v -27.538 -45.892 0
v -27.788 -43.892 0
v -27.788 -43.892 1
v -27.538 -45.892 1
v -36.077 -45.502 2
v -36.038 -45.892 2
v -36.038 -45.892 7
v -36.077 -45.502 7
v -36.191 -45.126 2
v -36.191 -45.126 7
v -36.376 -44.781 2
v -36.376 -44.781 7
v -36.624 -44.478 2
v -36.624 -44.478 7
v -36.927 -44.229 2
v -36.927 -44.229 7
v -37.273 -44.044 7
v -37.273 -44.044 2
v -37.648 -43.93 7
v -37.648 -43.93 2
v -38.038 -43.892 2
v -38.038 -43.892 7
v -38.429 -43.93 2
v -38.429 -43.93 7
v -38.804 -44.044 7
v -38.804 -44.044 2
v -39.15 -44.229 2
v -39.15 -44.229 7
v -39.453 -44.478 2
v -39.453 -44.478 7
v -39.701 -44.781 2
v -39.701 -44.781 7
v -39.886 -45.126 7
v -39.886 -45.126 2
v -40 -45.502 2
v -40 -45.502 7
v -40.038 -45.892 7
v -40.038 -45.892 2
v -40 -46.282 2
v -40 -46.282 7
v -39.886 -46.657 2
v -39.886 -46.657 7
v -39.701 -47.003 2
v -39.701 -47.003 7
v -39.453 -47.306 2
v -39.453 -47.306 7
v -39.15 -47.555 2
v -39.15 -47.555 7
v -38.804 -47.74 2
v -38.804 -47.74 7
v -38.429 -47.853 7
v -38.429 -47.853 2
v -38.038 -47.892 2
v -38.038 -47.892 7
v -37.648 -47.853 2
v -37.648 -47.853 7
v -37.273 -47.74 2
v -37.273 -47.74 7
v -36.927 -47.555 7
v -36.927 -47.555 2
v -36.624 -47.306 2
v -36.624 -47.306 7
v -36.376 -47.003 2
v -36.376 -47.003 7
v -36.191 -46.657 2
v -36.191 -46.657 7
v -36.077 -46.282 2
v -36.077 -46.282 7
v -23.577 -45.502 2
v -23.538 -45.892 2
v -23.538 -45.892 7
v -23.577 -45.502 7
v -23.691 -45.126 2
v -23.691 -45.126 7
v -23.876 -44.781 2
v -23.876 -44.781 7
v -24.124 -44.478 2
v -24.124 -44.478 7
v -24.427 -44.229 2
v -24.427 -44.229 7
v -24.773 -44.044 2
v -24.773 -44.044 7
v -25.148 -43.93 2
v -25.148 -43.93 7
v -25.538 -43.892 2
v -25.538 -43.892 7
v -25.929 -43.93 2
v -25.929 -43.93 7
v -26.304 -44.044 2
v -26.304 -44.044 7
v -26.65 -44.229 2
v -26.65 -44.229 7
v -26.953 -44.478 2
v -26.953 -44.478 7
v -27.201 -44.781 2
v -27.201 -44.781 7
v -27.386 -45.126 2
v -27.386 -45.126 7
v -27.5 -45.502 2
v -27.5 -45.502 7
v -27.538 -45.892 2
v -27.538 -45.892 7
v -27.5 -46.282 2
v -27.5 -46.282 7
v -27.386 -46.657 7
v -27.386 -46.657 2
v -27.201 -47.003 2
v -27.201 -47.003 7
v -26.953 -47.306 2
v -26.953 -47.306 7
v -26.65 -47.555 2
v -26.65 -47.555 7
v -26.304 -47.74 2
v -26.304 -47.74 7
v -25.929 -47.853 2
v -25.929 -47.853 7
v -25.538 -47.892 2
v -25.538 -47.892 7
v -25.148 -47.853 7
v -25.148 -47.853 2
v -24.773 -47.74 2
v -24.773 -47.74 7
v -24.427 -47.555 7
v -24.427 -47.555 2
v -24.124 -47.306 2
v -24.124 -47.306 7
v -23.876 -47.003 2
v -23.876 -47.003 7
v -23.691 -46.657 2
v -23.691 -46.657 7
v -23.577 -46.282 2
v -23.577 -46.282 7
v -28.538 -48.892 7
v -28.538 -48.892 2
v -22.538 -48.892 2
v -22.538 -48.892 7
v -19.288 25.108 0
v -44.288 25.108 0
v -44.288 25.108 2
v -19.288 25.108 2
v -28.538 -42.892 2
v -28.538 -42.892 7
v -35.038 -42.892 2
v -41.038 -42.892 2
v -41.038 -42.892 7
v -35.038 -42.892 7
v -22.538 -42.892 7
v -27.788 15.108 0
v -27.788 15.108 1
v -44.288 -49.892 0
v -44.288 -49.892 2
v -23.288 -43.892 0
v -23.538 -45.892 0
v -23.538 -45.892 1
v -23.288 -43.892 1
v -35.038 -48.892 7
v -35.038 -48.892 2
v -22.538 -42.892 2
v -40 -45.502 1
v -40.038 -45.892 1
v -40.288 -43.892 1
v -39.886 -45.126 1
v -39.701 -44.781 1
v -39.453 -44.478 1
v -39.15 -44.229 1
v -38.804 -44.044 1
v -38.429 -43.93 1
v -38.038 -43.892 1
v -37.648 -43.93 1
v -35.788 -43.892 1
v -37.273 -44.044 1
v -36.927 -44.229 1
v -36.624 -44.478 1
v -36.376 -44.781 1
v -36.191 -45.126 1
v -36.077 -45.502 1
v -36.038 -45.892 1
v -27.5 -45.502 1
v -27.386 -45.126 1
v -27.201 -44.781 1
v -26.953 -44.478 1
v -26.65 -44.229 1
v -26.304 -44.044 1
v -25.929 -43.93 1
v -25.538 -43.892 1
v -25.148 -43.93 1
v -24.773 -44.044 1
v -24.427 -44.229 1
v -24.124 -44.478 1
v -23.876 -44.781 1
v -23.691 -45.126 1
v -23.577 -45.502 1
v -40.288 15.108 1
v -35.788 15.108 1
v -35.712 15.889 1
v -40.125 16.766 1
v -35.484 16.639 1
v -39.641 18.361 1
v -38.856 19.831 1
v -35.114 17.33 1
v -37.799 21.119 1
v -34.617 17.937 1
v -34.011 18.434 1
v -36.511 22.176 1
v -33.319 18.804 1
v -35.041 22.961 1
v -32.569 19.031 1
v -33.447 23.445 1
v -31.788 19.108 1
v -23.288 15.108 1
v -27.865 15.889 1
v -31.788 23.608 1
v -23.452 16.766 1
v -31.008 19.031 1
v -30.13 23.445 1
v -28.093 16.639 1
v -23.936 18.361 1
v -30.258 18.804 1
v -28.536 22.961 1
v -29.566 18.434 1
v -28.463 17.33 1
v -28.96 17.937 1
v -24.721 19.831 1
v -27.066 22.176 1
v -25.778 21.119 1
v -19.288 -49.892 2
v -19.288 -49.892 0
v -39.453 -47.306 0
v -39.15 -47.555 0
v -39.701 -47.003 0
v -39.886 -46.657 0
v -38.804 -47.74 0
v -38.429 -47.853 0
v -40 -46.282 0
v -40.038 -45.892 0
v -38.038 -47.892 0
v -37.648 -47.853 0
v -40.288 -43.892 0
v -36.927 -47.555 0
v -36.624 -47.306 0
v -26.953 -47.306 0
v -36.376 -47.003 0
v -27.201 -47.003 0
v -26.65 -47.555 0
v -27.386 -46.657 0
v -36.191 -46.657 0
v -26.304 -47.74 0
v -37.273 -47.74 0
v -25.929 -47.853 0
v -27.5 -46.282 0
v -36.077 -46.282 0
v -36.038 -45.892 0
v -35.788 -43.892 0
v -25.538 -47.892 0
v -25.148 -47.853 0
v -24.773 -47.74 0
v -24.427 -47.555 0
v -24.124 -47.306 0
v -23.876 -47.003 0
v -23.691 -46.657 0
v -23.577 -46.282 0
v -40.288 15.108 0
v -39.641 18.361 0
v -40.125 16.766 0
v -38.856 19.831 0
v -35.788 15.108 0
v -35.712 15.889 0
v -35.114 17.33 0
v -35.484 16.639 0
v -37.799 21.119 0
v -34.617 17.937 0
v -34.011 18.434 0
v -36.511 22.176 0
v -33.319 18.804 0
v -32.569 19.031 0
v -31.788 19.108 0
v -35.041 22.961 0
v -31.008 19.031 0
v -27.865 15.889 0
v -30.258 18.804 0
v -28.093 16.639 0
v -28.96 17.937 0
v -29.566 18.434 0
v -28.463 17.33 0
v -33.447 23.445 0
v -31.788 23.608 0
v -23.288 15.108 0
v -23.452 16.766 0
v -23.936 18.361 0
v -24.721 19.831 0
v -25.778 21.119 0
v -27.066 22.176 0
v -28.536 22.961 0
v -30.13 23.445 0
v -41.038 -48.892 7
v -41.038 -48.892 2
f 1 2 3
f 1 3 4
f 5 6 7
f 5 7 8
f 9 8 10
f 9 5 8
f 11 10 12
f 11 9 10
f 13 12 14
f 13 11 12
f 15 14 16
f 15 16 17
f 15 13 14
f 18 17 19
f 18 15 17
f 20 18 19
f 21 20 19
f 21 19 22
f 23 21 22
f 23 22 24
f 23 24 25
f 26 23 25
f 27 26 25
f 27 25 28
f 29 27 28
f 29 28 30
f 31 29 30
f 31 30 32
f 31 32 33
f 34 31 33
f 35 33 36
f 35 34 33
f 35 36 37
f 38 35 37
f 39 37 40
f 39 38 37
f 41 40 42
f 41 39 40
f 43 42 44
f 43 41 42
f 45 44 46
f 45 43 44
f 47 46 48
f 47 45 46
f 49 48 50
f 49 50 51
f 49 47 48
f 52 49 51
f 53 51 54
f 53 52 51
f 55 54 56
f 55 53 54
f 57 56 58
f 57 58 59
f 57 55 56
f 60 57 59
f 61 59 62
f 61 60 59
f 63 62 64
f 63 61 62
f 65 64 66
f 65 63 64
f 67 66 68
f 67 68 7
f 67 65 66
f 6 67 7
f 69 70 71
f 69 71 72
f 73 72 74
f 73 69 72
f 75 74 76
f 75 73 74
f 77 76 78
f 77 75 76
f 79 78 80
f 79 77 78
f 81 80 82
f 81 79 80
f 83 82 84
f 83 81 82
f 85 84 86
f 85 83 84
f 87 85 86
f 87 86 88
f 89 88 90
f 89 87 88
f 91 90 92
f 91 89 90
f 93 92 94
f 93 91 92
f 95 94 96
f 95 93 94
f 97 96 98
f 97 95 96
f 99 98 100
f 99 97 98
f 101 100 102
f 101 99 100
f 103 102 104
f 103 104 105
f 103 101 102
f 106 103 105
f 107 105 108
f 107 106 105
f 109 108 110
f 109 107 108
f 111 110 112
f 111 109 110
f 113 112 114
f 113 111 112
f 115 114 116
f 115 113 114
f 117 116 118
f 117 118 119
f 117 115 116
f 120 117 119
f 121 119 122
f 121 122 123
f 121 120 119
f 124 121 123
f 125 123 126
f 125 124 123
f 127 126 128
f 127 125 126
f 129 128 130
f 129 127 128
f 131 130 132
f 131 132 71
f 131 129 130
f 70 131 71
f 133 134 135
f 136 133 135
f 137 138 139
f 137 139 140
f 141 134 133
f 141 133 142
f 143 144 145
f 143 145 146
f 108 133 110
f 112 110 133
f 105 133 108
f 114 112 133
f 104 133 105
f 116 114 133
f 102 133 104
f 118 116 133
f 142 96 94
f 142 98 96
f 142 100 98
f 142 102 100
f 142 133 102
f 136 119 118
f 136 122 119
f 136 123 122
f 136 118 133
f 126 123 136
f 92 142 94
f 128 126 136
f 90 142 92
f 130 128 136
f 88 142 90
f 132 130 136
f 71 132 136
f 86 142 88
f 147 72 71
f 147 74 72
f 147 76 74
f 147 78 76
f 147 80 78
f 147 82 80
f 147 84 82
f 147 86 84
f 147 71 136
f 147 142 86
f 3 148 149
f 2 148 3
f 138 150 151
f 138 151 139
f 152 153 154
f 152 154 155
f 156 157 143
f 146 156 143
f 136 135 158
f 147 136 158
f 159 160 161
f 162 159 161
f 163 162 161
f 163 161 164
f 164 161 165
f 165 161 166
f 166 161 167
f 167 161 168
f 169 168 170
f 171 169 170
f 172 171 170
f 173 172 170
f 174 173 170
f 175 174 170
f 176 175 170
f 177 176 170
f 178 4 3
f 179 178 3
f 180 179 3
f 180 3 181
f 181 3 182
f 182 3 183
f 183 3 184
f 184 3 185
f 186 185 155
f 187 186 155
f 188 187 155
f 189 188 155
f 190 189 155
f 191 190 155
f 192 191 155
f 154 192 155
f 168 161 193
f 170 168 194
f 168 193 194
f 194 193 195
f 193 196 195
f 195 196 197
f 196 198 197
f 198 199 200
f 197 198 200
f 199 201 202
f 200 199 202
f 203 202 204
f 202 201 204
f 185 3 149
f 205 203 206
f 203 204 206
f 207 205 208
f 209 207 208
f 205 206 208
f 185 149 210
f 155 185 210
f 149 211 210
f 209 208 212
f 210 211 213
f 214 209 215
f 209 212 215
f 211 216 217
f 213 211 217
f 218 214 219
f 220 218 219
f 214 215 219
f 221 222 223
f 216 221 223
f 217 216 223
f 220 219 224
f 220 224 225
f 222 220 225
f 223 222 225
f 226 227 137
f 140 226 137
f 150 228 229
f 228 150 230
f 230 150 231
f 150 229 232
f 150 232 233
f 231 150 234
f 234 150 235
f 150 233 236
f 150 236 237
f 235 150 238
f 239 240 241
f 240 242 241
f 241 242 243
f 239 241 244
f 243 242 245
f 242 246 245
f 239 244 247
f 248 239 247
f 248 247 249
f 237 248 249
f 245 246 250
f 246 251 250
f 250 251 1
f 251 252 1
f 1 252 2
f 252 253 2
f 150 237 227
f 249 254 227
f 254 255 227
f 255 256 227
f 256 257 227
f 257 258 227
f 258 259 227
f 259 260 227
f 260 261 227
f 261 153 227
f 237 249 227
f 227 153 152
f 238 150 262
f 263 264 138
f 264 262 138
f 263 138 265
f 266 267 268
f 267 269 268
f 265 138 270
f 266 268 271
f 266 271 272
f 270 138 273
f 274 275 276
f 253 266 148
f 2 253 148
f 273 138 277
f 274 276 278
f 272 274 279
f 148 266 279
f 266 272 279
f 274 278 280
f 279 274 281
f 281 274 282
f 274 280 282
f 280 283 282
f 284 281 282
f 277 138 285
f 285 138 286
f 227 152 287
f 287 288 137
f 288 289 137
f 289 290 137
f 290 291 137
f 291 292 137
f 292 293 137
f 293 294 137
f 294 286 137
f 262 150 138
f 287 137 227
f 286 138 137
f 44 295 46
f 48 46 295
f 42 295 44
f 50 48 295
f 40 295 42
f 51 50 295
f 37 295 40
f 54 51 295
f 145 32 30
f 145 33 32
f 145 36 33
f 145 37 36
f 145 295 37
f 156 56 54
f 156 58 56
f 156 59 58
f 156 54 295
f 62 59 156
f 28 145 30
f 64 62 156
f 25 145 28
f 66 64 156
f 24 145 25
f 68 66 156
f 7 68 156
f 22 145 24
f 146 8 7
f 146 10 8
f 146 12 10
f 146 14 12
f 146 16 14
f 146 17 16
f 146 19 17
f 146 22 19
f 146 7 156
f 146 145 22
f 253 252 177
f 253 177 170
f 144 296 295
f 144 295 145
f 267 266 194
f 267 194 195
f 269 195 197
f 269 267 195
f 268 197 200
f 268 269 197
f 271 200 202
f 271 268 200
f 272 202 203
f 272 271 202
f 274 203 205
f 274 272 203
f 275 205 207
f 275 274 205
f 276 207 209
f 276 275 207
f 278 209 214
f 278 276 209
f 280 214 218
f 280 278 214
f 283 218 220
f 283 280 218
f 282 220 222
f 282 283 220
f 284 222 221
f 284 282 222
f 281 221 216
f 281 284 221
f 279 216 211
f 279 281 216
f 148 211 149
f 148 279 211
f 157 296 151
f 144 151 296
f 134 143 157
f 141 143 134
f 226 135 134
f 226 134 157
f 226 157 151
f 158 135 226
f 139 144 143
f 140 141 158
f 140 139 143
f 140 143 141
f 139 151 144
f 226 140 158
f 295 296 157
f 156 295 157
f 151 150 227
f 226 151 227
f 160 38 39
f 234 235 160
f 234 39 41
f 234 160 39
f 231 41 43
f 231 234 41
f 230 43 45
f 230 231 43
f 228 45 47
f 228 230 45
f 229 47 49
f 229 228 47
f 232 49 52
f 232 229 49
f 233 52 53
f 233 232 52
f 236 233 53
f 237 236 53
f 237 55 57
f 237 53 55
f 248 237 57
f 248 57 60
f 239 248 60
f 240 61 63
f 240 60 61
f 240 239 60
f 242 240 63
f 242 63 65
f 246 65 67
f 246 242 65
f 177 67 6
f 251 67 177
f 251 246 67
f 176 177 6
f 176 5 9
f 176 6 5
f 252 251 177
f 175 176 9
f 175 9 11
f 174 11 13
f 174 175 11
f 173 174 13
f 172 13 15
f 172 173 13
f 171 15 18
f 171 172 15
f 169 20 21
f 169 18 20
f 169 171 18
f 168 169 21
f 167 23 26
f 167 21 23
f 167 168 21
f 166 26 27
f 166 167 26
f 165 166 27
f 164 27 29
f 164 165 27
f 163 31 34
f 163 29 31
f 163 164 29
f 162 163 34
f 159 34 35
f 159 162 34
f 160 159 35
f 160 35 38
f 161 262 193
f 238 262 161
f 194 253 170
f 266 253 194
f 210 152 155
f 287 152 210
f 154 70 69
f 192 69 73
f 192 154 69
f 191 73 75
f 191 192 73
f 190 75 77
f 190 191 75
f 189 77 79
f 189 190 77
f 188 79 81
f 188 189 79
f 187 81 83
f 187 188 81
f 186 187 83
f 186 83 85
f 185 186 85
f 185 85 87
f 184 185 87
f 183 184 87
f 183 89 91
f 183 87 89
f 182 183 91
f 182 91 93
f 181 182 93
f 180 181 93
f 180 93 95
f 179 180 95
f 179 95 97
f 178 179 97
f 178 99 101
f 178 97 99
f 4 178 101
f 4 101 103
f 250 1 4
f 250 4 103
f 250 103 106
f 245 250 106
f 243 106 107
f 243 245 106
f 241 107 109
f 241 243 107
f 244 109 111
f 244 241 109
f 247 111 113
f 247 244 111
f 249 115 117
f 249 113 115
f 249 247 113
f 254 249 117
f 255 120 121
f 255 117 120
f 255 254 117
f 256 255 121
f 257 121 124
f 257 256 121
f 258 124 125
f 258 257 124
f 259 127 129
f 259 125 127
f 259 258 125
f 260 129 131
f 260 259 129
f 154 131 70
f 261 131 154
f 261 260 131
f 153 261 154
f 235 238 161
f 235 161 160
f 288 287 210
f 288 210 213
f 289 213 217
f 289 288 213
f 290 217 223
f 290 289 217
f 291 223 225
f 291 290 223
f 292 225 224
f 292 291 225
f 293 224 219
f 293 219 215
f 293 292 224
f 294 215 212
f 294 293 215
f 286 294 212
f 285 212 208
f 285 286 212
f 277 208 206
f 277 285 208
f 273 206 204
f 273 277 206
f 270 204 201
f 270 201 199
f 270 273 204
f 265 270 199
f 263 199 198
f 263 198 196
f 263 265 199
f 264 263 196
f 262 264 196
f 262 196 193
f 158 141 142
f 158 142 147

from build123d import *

# Parameters (mm, degrees)
F0_W     = 25
F0_H     = 75
F3_DEPTH = 2
F4_DEPTH = 1
F7_DEPTH = 7
F6_W     = 6
F6_H     = 6
F6_R     = 2
F8_DEPTH = 5


with BuildPart() as f3:
    # F0 (on Top) → F3 (new body)
    with BuildSketch(Plane.XY):
        with Locations((-31.788486, -12.391831)):
            Rectangle(F0_W, F0_H)
    extrude(amount=F3_DEPTH)

    # F1 (on face) → F4 (cut)
    with BuildSketch(Plane.XY):
        with BuildLine():
            ThreePointArc((-27.538486, -45.891831), (-25.538486, -47.891831), (-23.538486, -45.891831))
            ThreePointArc((-23.538486, -45.891831), (-25.538486, -43.891831), (-27.538486, -45.891831))
        make_face()
        with BuildLine():
            ThreePointArc((-27.538486, -45.891831), (-25.538486, -43.891831), (-23.538486, -45.891831))
            Line((-23.538486, -45.891831), (-23.288486, -43.891831))
            Line((-23.288486, -43.891831), (-23.288486, 15.108169))
            ThreePointArc((-23.288486, 15.108169), (-31.788486, 23.608169), (-40.288486, 15.108169))
            Line((-40.288486, 15.108169), (-40.288486, -43.891831))
            Line((-40.288486, -43.891831), (-40.038486, -45.891831))
            ThreePointArc((-40.038486, -45.891831), (-38.038486, -43.891831), (-36.038486, -45.891831))
            Line((-36.038486, -45.891831), (-35.788486, -43.891831))
            Line((-35.788486, -43.891831), (-35.788486, 15.108169))
            ThreePointArc((-35.788486, 15.108169), (-31.788486, 19.108169), (-27.788486, 15.108169))
            Line((-27.788486, 15.108169), (-27.788486, -43.891831))
            Line((-27.788486, -43.891831), (-27.538486, -45.891831))
        make_face()
        with BuildLine():
            ThreePointArc((-36.038486, -45.891831), (-38.038486, -43.891831), (-40.038486, -45.891831))
            ThreePointArc((-40.038486, -45.891831), (-38.038486, -47.891831), (-36.038486, -45.891831))
        make_face()
    extrude(amount=F4_DEPTH, mode=Mode.SUBTRACT)

    # F1 (on face) → F7 (cut)
    with BuildSketch(Plane.XY):
        with BuildLine():
            ThreePointArc((-36.038486, -45.891831), (-38.038486, -43.891831), (-40.038486, -45.891831))
            ThreePointArc((-40.038486, -45.891831), (-38.038486, -47.891831), (-36.038486, -45.891831))
        make_face()
        with BuildLine():
            ThreePointArc((-27.538486, -45.891831), (-25.538486, -47.891831), (-23.538486, -45.891831))
            ThreePointArc((-23.538486, -45.891831), (-25.538486, -43.891831), (-27.538486, -45.891831))
        make_face()
    extrude(amount=F7_DEPTH, mode=Mode.SUBTRACT)

    # F6 (on face) → F8 (join)
    with BuildSketch(Plane.XY.offset(2)):
        with Locations((-38.038486, -45.891831)):
            Rectangle(F6_W, F6_H)
        with Locations((-38.038486, -45.891831)):
            Circle(F6_R, mode=Mode.SUBTRACT)
        with Locations((-25.538486, -45.891831)):
            Rectangle(F6_W, F6_H)
        with Locations((-25.538486, -45.891831)):
            Circle(F6_R, mode=Mode.SUBTRACT)
    extrude(amount=F8_DEPTH)


solid = f3.part
